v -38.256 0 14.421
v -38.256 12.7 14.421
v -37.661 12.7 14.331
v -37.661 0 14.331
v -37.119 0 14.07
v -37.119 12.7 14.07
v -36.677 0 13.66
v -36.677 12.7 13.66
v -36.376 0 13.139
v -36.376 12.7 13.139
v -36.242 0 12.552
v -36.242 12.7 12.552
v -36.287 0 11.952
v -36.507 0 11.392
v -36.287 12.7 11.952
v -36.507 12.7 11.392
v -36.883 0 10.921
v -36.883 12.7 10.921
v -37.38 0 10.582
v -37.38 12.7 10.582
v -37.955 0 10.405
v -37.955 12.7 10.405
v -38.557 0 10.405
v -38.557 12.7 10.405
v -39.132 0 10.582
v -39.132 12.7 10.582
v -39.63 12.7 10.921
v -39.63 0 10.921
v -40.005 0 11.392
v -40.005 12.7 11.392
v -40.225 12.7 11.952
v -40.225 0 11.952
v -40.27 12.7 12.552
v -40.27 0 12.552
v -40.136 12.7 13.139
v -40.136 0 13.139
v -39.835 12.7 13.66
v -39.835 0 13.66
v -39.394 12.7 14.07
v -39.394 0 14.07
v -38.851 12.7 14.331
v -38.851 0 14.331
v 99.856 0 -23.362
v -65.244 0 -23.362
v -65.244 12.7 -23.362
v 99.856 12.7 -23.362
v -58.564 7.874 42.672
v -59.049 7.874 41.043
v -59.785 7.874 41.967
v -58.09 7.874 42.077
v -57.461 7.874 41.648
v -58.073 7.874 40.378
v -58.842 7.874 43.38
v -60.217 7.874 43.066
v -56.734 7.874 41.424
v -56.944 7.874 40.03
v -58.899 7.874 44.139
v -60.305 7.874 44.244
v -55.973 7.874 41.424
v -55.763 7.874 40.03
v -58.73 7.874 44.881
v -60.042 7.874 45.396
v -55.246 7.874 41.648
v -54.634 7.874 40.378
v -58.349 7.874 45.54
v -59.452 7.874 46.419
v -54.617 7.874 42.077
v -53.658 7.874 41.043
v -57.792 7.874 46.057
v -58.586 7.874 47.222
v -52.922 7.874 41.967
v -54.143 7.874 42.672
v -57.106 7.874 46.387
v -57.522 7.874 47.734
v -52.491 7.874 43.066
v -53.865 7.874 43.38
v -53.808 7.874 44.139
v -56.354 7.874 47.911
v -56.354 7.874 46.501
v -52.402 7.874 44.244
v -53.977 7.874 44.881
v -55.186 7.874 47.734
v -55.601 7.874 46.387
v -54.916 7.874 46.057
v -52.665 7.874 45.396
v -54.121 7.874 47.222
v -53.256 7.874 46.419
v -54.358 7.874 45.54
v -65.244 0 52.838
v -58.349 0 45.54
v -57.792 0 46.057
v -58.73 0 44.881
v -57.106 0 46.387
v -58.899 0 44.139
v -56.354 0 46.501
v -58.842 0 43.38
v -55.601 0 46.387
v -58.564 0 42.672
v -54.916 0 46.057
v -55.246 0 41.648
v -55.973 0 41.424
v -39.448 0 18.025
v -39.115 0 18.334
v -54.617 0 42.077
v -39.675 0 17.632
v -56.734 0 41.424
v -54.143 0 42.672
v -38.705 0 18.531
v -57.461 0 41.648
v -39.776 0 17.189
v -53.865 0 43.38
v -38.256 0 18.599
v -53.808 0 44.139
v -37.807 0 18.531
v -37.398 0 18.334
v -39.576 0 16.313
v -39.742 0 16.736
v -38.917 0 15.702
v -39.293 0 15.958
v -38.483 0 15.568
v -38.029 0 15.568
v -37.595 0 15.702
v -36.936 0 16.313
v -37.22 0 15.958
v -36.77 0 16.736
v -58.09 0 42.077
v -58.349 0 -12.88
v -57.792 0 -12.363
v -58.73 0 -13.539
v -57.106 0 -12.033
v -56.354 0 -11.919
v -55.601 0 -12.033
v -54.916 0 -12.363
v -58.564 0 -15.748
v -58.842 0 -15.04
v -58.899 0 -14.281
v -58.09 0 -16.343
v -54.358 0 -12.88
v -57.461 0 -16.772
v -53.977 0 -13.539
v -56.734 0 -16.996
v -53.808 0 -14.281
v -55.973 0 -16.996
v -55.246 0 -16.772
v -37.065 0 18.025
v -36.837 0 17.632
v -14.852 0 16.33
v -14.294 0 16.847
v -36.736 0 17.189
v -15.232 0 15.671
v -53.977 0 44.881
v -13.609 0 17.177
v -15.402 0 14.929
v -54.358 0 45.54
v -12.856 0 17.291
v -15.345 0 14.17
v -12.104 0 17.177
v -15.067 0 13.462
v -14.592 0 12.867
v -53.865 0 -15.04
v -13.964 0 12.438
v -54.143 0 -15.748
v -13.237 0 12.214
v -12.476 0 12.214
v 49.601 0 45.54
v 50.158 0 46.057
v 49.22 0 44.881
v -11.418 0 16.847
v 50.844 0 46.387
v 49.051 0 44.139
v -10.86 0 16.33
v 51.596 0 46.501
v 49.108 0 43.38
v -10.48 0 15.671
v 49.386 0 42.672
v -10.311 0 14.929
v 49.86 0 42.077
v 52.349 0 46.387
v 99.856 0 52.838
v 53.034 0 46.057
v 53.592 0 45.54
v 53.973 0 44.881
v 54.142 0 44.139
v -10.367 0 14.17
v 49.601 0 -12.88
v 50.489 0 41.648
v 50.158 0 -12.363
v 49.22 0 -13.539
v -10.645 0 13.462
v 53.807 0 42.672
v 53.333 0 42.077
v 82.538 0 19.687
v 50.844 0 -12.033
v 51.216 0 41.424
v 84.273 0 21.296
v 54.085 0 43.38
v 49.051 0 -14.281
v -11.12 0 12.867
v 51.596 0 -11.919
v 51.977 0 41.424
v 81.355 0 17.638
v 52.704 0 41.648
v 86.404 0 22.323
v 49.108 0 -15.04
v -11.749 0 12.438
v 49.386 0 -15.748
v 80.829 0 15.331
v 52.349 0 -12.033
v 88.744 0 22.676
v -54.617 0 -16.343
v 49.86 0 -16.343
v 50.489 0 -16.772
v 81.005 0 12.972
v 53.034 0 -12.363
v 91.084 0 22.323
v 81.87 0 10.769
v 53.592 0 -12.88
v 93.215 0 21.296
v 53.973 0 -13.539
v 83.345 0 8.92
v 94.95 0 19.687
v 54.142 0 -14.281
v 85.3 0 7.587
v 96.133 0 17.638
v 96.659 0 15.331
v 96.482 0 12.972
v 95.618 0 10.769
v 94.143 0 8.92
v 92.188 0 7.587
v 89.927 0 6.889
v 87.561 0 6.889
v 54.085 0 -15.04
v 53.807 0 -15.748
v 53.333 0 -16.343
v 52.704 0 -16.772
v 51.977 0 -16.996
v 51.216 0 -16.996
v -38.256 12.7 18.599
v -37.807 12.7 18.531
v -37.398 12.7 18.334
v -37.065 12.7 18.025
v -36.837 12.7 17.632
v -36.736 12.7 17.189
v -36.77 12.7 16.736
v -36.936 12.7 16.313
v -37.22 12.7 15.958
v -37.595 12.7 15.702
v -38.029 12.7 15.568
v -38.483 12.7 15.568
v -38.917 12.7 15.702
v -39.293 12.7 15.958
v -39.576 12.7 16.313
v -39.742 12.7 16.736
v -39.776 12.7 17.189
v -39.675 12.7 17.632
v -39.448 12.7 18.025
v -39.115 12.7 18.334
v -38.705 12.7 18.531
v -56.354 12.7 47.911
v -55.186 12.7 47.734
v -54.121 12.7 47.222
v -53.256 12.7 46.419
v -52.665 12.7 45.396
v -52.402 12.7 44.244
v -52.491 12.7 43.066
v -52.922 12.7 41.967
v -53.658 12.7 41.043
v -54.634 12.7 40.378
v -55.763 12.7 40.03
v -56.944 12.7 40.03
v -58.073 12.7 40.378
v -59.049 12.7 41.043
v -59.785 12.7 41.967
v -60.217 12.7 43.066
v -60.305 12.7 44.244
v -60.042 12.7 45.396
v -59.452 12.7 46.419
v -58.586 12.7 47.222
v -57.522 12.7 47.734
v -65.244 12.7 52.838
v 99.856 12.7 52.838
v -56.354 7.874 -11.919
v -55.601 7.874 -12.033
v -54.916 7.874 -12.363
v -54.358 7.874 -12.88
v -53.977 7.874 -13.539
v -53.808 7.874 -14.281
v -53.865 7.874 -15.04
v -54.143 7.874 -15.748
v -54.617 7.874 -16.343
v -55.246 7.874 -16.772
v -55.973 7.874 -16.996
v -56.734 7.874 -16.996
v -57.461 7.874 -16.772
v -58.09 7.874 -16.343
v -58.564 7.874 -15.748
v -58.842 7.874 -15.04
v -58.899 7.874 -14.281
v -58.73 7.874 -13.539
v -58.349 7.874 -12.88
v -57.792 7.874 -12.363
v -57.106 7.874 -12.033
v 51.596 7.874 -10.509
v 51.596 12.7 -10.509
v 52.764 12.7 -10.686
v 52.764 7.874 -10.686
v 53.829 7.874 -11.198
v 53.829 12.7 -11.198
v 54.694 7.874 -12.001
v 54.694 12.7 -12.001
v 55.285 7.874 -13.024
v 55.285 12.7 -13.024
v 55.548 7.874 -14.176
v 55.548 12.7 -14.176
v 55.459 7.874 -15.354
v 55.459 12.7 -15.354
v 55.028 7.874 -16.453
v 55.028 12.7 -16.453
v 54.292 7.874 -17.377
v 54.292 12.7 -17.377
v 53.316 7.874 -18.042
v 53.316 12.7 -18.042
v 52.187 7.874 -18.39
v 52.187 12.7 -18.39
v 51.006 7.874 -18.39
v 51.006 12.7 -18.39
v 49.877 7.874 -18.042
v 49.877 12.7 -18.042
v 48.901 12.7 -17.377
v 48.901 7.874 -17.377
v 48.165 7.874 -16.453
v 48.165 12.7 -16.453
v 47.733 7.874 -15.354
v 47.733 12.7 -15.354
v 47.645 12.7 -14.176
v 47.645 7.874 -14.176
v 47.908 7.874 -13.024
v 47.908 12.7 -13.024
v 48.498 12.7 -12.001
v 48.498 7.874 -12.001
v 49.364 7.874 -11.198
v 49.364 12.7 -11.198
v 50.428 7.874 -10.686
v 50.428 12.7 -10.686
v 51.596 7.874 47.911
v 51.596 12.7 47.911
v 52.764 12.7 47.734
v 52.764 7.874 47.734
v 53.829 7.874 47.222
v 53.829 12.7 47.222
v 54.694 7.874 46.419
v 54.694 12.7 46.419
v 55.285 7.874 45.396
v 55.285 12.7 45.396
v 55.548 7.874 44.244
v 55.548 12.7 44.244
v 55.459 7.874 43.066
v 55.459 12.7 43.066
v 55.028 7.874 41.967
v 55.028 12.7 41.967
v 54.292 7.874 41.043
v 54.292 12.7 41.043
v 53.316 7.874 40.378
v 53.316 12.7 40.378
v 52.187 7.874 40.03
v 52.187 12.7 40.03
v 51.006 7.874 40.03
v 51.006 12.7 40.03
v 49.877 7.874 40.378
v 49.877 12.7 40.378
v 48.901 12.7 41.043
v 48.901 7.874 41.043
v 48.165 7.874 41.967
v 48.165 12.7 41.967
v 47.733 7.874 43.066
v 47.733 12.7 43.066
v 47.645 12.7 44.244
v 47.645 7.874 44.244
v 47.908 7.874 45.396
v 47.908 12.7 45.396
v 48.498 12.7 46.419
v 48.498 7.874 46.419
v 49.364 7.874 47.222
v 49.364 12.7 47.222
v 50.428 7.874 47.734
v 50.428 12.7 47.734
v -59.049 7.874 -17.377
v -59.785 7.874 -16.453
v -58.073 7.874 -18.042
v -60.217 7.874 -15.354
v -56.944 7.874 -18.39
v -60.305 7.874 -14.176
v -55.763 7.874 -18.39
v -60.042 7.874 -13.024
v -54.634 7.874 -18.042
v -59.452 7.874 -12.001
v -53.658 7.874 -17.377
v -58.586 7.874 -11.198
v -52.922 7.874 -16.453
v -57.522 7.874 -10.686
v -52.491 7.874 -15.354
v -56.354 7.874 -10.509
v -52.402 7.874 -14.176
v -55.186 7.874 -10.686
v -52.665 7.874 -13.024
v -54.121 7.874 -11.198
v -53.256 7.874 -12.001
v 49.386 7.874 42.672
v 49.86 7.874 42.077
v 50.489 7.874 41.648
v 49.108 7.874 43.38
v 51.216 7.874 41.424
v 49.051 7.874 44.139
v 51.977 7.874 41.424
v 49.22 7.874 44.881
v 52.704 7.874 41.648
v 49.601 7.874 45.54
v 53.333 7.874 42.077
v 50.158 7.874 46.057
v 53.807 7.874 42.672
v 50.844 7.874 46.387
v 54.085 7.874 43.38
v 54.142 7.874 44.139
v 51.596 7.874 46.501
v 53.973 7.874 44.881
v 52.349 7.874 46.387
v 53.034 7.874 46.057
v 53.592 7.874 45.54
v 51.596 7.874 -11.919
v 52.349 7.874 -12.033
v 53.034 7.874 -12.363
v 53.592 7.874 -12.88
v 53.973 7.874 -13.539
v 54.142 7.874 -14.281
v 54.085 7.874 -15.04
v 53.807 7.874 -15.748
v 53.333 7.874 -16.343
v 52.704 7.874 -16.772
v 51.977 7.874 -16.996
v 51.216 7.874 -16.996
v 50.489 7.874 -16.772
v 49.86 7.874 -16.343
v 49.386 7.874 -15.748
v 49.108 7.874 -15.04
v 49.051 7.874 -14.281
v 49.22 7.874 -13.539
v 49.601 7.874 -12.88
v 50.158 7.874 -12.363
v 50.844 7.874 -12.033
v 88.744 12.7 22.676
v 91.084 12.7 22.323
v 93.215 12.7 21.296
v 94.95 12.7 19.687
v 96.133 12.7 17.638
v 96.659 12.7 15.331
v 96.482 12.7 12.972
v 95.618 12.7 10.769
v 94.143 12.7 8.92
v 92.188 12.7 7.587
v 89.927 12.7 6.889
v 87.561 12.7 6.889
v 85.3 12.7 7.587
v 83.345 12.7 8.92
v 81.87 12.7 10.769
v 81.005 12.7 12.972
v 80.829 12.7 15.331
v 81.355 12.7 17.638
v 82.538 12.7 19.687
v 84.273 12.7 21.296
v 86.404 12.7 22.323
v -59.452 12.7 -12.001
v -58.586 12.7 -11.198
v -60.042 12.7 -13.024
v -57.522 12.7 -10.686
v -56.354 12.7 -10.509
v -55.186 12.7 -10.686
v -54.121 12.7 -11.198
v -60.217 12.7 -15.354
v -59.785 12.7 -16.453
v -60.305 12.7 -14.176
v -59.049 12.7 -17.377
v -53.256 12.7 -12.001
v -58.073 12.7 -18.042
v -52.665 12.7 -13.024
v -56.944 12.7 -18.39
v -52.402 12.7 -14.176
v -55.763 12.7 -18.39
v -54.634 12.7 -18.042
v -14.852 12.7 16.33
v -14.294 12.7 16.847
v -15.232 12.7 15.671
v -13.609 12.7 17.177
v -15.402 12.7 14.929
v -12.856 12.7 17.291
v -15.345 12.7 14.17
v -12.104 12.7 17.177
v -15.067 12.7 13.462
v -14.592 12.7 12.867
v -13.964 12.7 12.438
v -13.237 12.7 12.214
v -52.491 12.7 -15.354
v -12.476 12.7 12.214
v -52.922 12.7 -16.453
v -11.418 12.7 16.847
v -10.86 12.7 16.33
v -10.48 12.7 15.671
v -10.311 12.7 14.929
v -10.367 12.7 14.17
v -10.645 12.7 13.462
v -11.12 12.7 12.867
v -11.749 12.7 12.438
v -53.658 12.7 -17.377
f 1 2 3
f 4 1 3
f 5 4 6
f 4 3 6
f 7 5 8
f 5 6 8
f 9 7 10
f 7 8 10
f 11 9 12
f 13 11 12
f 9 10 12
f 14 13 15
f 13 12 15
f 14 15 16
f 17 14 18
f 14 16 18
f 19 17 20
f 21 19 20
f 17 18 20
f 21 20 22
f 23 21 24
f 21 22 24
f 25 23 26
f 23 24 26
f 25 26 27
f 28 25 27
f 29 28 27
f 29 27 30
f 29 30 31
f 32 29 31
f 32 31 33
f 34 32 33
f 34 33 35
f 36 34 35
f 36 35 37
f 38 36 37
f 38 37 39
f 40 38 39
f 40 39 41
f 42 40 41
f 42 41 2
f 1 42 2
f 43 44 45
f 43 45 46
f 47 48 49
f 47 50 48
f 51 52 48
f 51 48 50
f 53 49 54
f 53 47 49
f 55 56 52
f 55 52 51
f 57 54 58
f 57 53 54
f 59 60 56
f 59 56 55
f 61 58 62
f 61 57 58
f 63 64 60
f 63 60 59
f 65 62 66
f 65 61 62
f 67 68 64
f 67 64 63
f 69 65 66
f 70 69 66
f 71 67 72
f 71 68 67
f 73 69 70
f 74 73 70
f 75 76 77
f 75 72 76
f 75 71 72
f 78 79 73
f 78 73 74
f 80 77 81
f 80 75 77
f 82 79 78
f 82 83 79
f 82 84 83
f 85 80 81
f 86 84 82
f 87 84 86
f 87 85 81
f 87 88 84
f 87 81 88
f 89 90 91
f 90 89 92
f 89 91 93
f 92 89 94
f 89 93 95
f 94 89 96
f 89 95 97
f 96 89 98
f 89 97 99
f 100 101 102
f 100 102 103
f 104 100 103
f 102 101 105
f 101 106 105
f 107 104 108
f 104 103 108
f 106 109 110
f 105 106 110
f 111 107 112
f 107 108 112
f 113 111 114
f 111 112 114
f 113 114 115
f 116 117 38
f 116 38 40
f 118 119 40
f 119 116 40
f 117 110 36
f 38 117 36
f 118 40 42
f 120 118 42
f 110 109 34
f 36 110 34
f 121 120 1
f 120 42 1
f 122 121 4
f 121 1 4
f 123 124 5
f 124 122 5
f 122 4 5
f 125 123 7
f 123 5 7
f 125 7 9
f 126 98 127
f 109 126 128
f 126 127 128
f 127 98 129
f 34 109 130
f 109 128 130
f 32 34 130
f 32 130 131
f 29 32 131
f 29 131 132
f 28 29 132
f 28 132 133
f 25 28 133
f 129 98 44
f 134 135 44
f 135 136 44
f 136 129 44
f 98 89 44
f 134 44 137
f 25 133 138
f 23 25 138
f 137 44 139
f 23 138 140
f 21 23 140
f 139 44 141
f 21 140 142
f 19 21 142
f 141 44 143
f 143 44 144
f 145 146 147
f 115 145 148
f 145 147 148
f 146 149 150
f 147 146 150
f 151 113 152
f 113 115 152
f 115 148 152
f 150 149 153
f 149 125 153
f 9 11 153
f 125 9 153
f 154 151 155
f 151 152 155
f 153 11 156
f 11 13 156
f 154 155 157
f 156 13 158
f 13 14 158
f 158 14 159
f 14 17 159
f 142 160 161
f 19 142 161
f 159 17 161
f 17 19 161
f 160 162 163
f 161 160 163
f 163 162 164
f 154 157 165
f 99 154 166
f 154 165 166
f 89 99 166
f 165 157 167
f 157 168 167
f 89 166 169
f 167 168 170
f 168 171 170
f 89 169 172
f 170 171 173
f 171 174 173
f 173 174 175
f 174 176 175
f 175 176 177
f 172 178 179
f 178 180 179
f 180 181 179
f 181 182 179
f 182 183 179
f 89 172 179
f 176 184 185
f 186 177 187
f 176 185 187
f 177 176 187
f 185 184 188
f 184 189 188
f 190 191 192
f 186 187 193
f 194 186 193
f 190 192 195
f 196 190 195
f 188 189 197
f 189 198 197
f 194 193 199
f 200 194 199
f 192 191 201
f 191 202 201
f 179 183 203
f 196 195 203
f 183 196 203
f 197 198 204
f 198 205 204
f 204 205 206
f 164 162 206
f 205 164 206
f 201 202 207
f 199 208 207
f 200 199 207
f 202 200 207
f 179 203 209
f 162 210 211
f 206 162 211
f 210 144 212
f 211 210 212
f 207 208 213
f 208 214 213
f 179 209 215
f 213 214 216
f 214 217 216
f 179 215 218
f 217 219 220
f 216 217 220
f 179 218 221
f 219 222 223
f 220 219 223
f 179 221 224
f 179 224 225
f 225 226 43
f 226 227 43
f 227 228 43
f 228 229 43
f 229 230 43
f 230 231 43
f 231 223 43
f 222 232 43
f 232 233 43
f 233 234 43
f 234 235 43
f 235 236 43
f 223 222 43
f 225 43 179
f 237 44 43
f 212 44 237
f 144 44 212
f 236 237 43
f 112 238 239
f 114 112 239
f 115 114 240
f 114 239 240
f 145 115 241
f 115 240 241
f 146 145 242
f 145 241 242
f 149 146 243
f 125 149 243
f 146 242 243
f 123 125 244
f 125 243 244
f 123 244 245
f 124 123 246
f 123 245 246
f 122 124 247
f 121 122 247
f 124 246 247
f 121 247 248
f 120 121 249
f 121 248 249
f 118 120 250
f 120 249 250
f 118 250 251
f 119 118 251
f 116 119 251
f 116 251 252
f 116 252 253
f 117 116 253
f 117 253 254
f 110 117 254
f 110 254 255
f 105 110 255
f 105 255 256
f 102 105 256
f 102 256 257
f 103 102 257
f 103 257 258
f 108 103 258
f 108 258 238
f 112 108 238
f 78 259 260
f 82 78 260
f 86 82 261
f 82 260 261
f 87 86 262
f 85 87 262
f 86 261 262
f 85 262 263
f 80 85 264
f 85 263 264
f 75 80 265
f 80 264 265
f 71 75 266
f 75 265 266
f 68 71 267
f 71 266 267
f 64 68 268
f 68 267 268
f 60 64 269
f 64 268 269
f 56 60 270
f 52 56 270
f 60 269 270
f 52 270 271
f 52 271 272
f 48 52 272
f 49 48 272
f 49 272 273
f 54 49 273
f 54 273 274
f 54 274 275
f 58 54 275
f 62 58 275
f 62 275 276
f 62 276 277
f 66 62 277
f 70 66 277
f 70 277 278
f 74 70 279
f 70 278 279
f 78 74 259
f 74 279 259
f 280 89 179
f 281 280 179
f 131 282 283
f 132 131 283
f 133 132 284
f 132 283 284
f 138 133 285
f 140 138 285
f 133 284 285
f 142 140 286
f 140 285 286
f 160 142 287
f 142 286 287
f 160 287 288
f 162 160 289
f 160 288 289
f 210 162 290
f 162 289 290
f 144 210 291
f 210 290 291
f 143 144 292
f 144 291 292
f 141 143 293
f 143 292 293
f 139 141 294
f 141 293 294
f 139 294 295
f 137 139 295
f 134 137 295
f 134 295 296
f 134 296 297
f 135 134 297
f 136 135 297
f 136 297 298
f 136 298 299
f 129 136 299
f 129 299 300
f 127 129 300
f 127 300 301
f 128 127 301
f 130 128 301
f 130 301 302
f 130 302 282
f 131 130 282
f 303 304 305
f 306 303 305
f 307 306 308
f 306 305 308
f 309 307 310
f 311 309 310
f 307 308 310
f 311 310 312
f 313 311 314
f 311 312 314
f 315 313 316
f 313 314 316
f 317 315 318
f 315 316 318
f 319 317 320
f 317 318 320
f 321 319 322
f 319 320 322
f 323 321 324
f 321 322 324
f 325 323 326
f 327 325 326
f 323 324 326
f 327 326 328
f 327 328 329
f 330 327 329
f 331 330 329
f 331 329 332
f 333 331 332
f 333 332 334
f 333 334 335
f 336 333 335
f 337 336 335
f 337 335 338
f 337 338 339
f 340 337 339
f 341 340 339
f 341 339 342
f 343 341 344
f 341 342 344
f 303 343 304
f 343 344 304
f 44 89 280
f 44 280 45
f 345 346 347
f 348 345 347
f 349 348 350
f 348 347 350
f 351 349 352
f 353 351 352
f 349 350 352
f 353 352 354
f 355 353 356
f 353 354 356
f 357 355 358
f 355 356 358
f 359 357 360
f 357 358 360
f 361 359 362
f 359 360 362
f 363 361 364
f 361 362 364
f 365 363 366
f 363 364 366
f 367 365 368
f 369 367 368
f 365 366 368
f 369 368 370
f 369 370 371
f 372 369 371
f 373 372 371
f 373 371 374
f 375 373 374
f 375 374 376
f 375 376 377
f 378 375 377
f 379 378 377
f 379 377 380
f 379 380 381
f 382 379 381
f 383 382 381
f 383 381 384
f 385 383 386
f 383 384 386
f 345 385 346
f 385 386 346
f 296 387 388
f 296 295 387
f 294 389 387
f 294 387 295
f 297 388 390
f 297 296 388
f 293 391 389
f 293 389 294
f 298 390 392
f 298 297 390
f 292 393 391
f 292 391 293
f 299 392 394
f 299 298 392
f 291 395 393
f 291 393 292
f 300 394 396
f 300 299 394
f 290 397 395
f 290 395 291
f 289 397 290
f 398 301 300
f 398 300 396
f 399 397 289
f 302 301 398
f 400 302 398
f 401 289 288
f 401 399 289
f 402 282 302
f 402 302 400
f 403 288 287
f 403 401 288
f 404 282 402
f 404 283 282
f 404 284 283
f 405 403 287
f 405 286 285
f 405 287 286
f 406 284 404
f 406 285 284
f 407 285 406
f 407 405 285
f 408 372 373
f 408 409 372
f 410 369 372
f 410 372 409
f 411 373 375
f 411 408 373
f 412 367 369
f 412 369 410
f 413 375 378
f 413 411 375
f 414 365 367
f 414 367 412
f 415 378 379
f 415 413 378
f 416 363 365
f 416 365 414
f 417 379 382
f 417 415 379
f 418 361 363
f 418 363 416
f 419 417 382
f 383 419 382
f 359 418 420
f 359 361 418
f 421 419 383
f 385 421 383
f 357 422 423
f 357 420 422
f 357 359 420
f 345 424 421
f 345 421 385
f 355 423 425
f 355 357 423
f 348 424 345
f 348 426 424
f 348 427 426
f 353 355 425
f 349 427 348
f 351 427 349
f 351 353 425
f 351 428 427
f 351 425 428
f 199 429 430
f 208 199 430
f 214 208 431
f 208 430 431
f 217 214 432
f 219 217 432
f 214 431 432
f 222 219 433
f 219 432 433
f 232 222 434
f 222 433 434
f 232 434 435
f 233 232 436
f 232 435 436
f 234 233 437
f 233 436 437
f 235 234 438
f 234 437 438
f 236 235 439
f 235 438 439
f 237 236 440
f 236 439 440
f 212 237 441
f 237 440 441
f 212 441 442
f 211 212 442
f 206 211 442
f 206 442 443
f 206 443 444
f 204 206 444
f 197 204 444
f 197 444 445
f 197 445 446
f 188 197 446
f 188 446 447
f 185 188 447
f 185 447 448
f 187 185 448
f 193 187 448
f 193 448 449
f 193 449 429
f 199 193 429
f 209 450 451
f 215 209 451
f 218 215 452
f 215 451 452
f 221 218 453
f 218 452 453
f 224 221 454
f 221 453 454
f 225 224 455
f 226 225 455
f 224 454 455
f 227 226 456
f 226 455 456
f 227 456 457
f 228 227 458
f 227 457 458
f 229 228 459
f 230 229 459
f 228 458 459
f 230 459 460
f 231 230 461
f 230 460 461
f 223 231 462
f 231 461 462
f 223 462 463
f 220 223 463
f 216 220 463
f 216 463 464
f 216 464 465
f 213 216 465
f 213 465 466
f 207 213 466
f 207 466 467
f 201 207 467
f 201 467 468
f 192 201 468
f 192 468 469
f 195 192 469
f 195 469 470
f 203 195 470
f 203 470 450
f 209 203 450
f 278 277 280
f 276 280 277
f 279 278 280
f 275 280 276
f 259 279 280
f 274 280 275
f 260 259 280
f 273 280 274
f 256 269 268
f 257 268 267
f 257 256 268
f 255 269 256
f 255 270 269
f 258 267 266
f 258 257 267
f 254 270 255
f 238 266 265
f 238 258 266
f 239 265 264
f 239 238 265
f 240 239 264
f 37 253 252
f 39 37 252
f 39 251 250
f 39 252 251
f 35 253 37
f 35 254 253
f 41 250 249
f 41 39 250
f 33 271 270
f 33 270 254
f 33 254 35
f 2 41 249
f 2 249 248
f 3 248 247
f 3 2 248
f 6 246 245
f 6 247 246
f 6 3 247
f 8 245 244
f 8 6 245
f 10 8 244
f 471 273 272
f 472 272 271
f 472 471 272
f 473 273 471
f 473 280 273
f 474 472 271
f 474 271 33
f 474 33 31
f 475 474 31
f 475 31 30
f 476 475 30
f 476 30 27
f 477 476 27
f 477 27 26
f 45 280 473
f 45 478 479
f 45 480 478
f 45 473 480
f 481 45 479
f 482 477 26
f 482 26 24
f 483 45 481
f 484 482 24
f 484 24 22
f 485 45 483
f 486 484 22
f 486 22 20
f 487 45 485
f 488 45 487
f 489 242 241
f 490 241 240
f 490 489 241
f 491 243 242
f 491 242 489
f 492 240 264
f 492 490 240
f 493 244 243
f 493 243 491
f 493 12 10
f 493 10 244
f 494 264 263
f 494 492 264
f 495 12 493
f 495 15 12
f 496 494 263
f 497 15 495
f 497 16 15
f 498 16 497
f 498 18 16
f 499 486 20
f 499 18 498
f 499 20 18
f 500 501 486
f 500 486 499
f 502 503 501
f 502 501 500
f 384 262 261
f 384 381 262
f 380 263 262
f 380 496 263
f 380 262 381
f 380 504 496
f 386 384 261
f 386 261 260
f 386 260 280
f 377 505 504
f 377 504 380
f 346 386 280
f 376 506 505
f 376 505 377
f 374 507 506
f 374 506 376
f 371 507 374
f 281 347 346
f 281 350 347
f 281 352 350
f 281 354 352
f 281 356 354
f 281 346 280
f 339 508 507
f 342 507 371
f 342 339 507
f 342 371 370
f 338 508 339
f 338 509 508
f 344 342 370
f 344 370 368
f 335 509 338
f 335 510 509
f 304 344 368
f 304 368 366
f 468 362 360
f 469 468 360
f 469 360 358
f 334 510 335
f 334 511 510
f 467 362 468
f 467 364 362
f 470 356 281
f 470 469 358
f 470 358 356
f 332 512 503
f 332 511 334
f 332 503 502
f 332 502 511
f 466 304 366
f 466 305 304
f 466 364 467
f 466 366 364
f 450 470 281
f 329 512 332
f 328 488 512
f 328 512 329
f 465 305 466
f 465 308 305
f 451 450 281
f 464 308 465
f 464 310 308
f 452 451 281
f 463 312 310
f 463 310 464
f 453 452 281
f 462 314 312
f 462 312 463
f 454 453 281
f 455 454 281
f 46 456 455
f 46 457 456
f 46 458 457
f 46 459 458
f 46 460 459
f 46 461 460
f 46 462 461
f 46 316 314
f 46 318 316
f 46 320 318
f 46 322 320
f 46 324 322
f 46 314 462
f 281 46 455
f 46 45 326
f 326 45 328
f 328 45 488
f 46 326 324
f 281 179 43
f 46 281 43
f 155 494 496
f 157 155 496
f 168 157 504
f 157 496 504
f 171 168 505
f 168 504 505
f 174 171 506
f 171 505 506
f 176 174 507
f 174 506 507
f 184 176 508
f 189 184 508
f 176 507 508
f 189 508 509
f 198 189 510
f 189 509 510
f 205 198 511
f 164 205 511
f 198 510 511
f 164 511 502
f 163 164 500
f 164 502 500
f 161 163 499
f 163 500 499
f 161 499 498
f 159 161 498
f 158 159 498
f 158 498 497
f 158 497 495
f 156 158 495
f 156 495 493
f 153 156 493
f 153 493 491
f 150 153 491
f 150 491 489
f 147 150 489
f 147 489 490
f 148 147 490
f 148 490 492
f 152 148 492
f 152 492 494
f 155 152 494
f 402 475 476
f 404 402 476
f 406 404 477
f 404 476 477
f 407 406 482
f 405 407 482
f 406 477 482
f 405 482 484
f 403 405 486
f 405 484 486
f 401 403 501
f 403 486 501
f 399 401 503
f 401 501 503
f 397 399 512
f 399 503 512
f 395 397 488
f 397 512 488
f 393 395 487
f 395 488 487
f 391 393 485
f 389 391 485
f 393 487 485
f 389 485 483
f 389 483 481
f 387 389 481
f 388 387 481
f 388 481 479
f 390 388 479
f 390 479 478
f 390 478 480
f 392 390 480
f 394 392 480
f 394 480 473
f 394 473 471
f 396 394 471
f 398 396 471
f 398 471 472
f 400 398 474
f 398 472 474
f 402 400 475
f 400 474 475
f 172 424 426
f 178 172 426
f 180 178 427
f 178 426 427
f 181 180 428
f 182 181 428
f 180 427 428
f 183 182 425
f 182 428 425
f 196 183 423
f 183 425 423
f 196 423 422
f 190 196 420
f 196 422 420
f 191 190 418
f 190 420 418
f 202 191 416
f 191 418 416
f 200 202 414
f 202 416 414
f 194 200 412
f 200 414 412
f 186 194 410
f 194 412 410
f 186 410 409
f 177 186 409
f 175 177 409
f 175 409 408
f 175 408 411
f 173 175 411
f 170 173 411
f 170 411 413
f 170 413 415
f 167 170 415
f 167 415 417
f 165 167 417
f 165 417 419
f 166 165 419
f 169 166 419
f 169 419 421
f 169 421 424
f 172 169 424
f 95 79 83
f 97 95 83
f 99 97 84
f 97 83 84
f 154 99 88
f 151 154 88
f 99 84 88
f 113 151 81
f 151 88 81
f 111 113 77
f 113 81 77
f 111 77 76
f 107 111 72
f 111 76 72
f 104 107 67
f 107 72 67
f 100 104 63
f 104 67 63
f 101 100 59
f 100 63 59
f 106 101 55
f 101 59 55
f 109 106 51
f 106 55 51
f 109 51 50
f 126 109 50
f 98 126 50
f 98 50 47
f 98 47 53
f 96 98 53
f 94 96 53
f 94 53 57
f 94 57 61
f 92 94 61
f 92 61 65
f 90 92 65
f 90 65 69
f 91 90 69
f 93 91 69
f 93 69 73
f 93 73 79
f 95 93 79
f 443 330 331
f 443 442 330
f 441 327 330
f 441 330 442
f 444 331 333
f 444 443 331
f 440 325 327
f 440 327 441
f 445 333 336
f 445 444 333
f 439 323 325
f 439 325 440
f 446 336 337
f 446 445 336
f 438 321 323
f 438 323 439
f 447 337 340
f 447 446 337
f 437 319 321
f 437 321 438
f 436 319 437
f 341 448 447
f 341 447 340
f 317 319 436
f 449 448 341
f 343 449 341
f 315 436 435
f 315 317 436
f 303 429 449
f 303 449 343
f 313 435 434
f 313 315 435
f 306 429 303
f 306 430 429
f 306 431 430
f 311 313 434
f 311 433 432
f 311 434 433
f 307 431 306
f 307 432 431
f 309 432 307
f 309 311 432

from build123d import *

# Parameters (mm, degrees)
SKETCH1_W           = 165.1
SKETCH1_H           = 76.2
BOSS_EXTRUDE1_DEPTH = 12.7
SKETCH2_R           = 3.9624
SKETCH2_R_2         = 2.5527
CUT_EXTRUDE3_DEPTH  = 4.826
SKETCH10_R          = 2.5527
CUT_EXTRUDE9_DEPTH  = 22.352
SKETCH11_R          = 7.9375
SKETCH11_R_2        = 2.5527
SKETCH11_R_3        = 2.0193
SKETCH11_R_4        = 1.524
CUT_EXTRUDE10_DEPTH = 22.352


with BuildPart() as part:
    # Sketch1 → Boss-Extrude1 (new body)
    with BuildSketch(Plane(origin=(0, 0, 0), x_dir=(1, 0, 0), z_dir=(0, 1, 0))):
        with Locations((17.306400742, -14.73812616)):
            Rectangle(SKETCH1_W, SKETCH1_H)
    extrude(amount=BOSS_EXTRUDE1_DEPTH)

    # Sketch2 → Cut-Extrude3 (cut)
    # profile 1 of 4: a face of its own
    with BuildSketch(Plane(origin=(0, 12.7, 0), x_dir=(1, 0, 0), z_dir=(0, 1, 0))):
        with Locations(Location((-56.353599258, -43.94812616, 0), (0, 0, 270))):
            Circle(SKETCH2_R)
        with Locations(Location((-56.353599258, -43.94812616, 0), (0, 0, 270))):
            Circle(SKETCH2_R_2, mode=Mode.SUBTRACT)
    # profile 2 of 4: a face of its own
    with BuildSketch(Plane(origin=(0, 12.7, 0), x_dir=(1, 0, 0), z_dir=(0, 1, 0))):
        with Locations(Location((-56.353599258, 14.47187384, 0), (0, 0, 270))):
            Circle(SKETCH2_R)
        with Locations(Location((-56.353599258, 14.47187384, 0), (0, 0, 270))):
            Circle(SKETCH2_R_2, mode=Mode.SUBTRACT)
    # profile 3 of 4: a face of its own
    with BuildSketch(Plane(origin=(0, 12.7, 0), x_dir=(1, 0, 0), z_dir=(0, 1, 0))):
        with Locations(Location((51.596400742, 14.47187384, 0), (0, 0, 270))):
            Circle(SKETCH2_R)
        with Locations(Location((51.596400742, 14.47187384, 0), (0, 0, 270))):
            Circle(SKETCH2_R_2, mode=Mode.SUBTRACT)
    # profile 4 of 4: a face of its own
    with BuildSketch(Plane(origin=(0, 12.7, 0), x_dir=(1, 0, 0), z_dir=(0, 1, 0))):
        with Locations(Location((51.596400742, -43.94812616, 0), (0, 0, 270))):
            Circle(SKETCH2_R)
        with Locations(Location((51.596400742, -43.94812616, 0), (0, 0, 270))):
            Circle(SKETCH2_R_2, mode=Mode.SUBTRACT)
    extrude(amount=-CUT_EXTRUDE3_DEPTH, mode=Mode.SUBTRACT)

    # Sketch10 → Cut-Extrude9 (cut)
    with BuildSketch(Plane(origin=(0, 12.7, 0), x_dir=(1, 0, 0), z_dir=(0, 1, 0))):
        with Locations(Location((-56.353599258, -43.94812616, 0), (0, 0, 270))):
            Circle(SKETCH10_R)
        with Locations(Location((-56.353599258, 14.47187384, 0), (0, 0, 270))):
            Circle(SKETCH10_R)
        with Locations(Location((51.596400742, 14.47187384, 0), (0, 0, 270))):
            Circle(SKETCH10_R)
        with Locations(Location((51.596400742, -43.94812616, 0), (0, 0, 270))):
            Circle(SKETCH10_R)
    extrude(amount=-CUT_EXTRUDE9_DEPTH, mode=Mode.SUBTRACT)

    # Sketch11 → Cut-Extrude10 (cut)
    with BuildSketch(Plane(origin=(0, 12.7, 0), x_dir=(1, 0, 0), z_dir=(0, 1, 0))):
        with Locations(Location((88.743900742, -14.73812616, 0), (0, 0, 270))):
            Circle(SKETCH11_R)
        with Locations(Location((-12.856099258, -14.73812616, 0), (0, 0, 270))):
            Circle(SKETCH11_R_2)
        with Locations(Location((-38.256099258, -12.40132616, 0), (0, 0, 270))):
            Circle(SKETCH11_R_3)
        with Locations(Location((-38.256099258, -17.07492616, 0), (0, 0, 270))):
            Circle(SKETCH11_R_4)
    extrude(amount=-CUT_EXTRUDE10_DEPTH, mode=Mode.SUBTRACT)


solid = part.part
